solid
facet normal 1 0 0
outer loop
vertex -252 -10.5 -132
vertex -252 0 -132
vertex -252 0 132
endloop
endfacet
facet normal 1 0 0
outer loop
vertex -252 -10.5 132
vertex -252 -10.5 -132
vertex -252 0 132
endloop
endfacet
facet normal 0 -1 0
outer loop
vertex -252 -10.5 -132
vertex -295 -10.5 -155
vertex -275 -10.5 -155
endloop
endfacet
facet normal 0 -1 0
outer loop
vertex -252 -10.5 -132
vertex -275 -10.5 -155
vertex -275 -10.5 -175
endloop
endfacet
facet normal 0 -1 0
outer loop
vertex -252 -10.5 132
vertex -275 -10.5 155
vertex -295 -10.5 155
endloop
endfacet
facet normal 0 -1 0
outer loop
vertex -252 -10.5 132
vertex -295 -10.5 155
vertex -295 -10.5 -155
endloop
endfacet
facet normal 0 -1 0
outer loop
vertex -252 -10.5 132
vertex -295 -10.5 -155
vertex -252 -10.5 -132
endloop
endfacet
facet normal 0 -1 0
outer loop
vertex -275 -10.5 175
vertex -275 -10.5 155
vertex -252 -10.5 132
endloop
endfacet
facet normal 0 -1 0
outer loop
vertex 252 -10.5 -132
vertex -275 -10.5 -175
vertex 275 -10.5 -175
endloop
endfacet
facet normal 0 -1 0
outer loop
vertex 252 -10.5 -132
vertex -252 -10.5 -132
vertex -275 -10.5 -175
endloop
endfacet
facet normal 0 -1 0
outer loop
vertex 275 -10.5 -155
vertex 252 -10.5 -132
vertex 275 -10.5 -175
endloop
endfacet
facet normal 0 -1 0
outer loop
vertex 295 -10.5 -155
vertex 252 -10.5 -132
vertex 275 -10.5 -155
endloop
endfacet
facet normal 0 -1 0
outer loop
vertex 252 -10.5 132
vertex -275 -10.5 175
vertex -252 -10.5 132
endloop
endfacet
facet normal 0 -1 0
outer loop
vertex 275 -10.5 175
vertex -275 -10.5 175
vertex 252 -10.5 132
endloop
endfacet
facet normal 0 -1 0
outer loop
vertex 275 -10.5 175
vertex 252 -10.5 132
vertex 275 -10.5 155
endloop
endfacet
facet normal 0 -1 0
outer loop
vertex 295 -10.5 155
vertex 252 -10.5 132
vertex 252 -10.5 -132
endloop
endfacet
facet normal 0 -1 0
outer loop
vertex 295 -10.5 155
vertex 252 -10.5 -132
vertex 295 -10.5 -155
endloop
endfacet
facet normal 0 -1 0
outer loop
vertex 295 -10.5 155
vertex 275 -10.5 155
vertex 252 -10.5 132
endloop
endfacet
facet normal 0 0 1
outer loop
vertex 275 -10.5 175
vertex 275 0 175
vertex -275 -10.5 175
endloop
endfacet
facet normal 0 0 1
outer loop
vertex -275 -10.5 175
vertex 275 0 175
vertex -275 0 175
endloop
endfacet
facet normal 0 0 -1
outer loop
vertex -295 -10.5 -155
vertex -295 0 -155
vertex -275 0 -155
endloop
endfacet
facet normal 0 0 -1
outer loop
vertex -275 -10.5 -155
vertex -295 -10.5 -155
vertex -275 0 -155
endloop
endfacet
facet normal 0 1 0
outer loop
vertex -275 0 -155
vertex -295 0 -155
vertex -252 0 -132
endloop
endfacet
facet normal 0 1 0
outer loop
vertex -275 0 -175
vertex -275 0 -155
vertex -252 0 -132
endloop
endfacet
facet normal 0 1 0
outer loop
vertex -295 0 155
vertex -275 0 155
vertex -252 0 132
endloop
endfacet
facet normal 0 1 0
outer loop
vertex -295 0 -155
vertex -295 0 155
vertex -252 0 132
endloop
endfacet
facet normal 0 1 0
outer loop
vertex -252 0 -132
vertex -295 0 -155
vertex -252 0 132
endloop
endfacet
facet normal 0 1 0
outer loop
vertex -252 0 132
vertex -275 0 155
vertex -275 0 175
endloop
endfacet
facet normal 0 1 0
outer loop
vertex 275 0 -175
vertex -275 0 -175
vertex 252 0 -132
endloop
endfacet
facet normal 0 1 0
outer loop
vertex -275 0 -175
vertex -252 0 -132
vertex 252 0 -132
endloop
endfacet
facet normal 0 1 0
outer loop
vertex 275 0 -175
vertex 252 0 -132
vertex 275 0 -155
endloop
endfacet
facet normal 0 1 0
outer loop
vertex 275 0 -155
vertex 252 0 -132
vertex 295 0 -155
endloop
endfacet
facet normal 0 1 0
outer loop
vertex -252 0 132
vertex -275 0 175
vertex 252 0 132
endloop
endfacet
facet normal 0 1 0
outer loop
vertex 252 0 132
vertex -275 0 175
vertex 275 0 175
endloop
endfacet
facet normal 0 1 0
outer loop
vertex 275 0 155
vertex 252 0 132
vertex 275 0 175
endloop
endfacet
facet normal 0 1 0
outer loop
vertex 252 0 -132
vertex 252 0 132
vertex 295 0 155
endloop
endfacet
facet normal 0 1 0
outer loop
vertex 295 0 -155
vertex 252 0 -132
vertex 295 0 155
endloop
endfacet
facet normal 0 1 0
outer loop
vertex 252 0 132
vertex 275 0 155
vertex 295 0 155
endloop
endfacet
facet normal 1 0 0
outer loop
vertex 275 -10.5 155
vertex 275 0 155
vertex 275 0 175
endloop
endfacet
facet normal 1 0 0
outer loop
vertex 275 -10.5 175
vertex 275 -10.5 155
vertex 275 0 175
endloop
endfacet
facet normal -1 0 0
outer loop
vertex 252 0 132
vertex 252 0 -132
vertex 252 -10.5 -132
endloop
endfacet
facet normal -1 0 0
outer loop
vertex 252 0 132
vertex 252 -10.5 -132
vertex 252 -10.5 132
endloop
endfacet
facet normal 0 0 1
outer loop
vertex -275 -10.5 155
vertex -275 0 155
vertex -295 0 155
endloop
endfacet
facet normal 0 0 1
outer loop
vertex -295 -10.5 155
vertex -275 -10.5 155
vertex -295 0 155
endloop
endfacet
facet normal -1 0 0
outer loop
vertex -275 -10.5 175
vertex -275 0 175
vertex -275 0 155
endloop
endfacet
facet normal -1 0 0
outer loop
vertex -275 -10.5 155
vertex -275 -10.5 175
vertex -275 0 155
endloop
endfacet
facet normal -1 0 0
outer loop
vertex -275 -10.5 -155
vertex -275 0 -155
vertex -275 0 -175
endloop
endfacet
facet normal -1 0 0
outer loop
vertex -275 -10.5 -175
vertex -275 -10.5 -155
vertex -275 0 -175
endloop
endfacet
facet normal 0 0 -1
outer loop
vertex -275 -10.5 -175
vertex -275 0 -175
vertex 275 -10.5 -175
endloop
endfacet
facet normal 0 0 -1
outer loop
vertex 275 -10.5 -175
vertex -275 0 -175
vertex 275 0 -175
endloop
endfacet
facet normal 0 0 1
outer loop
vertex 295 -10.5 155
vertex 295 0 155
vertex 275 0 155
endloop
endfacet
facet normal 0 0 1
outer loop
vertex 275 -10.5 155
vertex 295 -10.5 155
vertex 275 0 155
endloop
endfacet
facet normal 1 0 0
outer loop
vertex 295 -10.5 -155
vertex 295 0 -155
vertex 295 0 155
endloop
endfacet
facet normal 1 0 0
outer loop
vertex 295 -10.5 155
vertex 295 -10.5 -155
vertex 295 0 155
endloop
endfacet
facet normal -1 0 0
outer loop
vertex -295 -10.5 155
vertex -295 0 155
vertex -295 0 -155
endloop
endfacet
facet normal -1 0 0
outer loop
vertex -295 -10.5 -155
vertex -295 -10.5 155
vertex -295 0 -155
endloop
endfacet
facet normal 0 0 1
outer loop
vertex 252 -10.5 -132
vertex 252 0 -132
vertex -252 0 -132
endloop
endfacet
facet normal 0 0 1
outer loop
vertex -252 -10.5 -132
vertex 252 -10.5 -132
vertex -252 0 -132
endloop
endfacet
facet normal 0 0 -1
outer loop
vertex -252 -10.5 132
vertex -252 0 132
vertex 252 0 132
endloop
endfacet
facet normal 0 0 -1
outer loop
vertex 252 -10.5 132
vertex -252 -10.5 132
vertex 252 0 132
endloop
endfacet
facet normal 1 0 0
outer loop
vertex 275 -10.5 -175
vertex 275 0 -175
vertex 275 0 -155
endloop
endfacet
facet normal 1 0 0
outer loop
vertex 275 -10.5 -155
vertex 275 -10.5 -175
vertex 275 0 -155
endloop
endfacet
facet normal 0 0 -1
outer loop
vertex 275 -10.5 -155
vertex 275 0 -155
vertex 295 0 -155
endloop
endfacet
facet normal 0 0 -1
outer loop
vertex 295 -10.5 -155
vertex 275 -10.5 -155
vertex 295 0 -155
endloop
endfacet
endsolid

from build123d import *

# Parameters (mm, degrees)
F0_W     = 43
F0_H     = 264
F1_DEPTH = 10.5


with BuildPart() as f1:
    # F0 (on Front) → F1 (new body)
    with BuildSketch(Plane.XZ):
        Polygon((275, 155), (275, 175), (-275, 175), (-275, 155), (-295, 155), (-295, 132), (-252, 132), (252, 132), (295, 132), (295, 155), align=None)
        with Locations((273.5, 0)):
            Rectangle(F0_W, F0_H)
        with Locations((-273.5, 0)):
            Rectangle(F0_W, F0_H)
        Polygon((295, -155), (295, -132), (252, -132), (-252, -132), (-295, -132), (-295, -155), (-275, -155), (-275, -175), (275, -175), (275, -155), align=None)
    extrude(amount=F1_DEPTH)


solid = f1.part
